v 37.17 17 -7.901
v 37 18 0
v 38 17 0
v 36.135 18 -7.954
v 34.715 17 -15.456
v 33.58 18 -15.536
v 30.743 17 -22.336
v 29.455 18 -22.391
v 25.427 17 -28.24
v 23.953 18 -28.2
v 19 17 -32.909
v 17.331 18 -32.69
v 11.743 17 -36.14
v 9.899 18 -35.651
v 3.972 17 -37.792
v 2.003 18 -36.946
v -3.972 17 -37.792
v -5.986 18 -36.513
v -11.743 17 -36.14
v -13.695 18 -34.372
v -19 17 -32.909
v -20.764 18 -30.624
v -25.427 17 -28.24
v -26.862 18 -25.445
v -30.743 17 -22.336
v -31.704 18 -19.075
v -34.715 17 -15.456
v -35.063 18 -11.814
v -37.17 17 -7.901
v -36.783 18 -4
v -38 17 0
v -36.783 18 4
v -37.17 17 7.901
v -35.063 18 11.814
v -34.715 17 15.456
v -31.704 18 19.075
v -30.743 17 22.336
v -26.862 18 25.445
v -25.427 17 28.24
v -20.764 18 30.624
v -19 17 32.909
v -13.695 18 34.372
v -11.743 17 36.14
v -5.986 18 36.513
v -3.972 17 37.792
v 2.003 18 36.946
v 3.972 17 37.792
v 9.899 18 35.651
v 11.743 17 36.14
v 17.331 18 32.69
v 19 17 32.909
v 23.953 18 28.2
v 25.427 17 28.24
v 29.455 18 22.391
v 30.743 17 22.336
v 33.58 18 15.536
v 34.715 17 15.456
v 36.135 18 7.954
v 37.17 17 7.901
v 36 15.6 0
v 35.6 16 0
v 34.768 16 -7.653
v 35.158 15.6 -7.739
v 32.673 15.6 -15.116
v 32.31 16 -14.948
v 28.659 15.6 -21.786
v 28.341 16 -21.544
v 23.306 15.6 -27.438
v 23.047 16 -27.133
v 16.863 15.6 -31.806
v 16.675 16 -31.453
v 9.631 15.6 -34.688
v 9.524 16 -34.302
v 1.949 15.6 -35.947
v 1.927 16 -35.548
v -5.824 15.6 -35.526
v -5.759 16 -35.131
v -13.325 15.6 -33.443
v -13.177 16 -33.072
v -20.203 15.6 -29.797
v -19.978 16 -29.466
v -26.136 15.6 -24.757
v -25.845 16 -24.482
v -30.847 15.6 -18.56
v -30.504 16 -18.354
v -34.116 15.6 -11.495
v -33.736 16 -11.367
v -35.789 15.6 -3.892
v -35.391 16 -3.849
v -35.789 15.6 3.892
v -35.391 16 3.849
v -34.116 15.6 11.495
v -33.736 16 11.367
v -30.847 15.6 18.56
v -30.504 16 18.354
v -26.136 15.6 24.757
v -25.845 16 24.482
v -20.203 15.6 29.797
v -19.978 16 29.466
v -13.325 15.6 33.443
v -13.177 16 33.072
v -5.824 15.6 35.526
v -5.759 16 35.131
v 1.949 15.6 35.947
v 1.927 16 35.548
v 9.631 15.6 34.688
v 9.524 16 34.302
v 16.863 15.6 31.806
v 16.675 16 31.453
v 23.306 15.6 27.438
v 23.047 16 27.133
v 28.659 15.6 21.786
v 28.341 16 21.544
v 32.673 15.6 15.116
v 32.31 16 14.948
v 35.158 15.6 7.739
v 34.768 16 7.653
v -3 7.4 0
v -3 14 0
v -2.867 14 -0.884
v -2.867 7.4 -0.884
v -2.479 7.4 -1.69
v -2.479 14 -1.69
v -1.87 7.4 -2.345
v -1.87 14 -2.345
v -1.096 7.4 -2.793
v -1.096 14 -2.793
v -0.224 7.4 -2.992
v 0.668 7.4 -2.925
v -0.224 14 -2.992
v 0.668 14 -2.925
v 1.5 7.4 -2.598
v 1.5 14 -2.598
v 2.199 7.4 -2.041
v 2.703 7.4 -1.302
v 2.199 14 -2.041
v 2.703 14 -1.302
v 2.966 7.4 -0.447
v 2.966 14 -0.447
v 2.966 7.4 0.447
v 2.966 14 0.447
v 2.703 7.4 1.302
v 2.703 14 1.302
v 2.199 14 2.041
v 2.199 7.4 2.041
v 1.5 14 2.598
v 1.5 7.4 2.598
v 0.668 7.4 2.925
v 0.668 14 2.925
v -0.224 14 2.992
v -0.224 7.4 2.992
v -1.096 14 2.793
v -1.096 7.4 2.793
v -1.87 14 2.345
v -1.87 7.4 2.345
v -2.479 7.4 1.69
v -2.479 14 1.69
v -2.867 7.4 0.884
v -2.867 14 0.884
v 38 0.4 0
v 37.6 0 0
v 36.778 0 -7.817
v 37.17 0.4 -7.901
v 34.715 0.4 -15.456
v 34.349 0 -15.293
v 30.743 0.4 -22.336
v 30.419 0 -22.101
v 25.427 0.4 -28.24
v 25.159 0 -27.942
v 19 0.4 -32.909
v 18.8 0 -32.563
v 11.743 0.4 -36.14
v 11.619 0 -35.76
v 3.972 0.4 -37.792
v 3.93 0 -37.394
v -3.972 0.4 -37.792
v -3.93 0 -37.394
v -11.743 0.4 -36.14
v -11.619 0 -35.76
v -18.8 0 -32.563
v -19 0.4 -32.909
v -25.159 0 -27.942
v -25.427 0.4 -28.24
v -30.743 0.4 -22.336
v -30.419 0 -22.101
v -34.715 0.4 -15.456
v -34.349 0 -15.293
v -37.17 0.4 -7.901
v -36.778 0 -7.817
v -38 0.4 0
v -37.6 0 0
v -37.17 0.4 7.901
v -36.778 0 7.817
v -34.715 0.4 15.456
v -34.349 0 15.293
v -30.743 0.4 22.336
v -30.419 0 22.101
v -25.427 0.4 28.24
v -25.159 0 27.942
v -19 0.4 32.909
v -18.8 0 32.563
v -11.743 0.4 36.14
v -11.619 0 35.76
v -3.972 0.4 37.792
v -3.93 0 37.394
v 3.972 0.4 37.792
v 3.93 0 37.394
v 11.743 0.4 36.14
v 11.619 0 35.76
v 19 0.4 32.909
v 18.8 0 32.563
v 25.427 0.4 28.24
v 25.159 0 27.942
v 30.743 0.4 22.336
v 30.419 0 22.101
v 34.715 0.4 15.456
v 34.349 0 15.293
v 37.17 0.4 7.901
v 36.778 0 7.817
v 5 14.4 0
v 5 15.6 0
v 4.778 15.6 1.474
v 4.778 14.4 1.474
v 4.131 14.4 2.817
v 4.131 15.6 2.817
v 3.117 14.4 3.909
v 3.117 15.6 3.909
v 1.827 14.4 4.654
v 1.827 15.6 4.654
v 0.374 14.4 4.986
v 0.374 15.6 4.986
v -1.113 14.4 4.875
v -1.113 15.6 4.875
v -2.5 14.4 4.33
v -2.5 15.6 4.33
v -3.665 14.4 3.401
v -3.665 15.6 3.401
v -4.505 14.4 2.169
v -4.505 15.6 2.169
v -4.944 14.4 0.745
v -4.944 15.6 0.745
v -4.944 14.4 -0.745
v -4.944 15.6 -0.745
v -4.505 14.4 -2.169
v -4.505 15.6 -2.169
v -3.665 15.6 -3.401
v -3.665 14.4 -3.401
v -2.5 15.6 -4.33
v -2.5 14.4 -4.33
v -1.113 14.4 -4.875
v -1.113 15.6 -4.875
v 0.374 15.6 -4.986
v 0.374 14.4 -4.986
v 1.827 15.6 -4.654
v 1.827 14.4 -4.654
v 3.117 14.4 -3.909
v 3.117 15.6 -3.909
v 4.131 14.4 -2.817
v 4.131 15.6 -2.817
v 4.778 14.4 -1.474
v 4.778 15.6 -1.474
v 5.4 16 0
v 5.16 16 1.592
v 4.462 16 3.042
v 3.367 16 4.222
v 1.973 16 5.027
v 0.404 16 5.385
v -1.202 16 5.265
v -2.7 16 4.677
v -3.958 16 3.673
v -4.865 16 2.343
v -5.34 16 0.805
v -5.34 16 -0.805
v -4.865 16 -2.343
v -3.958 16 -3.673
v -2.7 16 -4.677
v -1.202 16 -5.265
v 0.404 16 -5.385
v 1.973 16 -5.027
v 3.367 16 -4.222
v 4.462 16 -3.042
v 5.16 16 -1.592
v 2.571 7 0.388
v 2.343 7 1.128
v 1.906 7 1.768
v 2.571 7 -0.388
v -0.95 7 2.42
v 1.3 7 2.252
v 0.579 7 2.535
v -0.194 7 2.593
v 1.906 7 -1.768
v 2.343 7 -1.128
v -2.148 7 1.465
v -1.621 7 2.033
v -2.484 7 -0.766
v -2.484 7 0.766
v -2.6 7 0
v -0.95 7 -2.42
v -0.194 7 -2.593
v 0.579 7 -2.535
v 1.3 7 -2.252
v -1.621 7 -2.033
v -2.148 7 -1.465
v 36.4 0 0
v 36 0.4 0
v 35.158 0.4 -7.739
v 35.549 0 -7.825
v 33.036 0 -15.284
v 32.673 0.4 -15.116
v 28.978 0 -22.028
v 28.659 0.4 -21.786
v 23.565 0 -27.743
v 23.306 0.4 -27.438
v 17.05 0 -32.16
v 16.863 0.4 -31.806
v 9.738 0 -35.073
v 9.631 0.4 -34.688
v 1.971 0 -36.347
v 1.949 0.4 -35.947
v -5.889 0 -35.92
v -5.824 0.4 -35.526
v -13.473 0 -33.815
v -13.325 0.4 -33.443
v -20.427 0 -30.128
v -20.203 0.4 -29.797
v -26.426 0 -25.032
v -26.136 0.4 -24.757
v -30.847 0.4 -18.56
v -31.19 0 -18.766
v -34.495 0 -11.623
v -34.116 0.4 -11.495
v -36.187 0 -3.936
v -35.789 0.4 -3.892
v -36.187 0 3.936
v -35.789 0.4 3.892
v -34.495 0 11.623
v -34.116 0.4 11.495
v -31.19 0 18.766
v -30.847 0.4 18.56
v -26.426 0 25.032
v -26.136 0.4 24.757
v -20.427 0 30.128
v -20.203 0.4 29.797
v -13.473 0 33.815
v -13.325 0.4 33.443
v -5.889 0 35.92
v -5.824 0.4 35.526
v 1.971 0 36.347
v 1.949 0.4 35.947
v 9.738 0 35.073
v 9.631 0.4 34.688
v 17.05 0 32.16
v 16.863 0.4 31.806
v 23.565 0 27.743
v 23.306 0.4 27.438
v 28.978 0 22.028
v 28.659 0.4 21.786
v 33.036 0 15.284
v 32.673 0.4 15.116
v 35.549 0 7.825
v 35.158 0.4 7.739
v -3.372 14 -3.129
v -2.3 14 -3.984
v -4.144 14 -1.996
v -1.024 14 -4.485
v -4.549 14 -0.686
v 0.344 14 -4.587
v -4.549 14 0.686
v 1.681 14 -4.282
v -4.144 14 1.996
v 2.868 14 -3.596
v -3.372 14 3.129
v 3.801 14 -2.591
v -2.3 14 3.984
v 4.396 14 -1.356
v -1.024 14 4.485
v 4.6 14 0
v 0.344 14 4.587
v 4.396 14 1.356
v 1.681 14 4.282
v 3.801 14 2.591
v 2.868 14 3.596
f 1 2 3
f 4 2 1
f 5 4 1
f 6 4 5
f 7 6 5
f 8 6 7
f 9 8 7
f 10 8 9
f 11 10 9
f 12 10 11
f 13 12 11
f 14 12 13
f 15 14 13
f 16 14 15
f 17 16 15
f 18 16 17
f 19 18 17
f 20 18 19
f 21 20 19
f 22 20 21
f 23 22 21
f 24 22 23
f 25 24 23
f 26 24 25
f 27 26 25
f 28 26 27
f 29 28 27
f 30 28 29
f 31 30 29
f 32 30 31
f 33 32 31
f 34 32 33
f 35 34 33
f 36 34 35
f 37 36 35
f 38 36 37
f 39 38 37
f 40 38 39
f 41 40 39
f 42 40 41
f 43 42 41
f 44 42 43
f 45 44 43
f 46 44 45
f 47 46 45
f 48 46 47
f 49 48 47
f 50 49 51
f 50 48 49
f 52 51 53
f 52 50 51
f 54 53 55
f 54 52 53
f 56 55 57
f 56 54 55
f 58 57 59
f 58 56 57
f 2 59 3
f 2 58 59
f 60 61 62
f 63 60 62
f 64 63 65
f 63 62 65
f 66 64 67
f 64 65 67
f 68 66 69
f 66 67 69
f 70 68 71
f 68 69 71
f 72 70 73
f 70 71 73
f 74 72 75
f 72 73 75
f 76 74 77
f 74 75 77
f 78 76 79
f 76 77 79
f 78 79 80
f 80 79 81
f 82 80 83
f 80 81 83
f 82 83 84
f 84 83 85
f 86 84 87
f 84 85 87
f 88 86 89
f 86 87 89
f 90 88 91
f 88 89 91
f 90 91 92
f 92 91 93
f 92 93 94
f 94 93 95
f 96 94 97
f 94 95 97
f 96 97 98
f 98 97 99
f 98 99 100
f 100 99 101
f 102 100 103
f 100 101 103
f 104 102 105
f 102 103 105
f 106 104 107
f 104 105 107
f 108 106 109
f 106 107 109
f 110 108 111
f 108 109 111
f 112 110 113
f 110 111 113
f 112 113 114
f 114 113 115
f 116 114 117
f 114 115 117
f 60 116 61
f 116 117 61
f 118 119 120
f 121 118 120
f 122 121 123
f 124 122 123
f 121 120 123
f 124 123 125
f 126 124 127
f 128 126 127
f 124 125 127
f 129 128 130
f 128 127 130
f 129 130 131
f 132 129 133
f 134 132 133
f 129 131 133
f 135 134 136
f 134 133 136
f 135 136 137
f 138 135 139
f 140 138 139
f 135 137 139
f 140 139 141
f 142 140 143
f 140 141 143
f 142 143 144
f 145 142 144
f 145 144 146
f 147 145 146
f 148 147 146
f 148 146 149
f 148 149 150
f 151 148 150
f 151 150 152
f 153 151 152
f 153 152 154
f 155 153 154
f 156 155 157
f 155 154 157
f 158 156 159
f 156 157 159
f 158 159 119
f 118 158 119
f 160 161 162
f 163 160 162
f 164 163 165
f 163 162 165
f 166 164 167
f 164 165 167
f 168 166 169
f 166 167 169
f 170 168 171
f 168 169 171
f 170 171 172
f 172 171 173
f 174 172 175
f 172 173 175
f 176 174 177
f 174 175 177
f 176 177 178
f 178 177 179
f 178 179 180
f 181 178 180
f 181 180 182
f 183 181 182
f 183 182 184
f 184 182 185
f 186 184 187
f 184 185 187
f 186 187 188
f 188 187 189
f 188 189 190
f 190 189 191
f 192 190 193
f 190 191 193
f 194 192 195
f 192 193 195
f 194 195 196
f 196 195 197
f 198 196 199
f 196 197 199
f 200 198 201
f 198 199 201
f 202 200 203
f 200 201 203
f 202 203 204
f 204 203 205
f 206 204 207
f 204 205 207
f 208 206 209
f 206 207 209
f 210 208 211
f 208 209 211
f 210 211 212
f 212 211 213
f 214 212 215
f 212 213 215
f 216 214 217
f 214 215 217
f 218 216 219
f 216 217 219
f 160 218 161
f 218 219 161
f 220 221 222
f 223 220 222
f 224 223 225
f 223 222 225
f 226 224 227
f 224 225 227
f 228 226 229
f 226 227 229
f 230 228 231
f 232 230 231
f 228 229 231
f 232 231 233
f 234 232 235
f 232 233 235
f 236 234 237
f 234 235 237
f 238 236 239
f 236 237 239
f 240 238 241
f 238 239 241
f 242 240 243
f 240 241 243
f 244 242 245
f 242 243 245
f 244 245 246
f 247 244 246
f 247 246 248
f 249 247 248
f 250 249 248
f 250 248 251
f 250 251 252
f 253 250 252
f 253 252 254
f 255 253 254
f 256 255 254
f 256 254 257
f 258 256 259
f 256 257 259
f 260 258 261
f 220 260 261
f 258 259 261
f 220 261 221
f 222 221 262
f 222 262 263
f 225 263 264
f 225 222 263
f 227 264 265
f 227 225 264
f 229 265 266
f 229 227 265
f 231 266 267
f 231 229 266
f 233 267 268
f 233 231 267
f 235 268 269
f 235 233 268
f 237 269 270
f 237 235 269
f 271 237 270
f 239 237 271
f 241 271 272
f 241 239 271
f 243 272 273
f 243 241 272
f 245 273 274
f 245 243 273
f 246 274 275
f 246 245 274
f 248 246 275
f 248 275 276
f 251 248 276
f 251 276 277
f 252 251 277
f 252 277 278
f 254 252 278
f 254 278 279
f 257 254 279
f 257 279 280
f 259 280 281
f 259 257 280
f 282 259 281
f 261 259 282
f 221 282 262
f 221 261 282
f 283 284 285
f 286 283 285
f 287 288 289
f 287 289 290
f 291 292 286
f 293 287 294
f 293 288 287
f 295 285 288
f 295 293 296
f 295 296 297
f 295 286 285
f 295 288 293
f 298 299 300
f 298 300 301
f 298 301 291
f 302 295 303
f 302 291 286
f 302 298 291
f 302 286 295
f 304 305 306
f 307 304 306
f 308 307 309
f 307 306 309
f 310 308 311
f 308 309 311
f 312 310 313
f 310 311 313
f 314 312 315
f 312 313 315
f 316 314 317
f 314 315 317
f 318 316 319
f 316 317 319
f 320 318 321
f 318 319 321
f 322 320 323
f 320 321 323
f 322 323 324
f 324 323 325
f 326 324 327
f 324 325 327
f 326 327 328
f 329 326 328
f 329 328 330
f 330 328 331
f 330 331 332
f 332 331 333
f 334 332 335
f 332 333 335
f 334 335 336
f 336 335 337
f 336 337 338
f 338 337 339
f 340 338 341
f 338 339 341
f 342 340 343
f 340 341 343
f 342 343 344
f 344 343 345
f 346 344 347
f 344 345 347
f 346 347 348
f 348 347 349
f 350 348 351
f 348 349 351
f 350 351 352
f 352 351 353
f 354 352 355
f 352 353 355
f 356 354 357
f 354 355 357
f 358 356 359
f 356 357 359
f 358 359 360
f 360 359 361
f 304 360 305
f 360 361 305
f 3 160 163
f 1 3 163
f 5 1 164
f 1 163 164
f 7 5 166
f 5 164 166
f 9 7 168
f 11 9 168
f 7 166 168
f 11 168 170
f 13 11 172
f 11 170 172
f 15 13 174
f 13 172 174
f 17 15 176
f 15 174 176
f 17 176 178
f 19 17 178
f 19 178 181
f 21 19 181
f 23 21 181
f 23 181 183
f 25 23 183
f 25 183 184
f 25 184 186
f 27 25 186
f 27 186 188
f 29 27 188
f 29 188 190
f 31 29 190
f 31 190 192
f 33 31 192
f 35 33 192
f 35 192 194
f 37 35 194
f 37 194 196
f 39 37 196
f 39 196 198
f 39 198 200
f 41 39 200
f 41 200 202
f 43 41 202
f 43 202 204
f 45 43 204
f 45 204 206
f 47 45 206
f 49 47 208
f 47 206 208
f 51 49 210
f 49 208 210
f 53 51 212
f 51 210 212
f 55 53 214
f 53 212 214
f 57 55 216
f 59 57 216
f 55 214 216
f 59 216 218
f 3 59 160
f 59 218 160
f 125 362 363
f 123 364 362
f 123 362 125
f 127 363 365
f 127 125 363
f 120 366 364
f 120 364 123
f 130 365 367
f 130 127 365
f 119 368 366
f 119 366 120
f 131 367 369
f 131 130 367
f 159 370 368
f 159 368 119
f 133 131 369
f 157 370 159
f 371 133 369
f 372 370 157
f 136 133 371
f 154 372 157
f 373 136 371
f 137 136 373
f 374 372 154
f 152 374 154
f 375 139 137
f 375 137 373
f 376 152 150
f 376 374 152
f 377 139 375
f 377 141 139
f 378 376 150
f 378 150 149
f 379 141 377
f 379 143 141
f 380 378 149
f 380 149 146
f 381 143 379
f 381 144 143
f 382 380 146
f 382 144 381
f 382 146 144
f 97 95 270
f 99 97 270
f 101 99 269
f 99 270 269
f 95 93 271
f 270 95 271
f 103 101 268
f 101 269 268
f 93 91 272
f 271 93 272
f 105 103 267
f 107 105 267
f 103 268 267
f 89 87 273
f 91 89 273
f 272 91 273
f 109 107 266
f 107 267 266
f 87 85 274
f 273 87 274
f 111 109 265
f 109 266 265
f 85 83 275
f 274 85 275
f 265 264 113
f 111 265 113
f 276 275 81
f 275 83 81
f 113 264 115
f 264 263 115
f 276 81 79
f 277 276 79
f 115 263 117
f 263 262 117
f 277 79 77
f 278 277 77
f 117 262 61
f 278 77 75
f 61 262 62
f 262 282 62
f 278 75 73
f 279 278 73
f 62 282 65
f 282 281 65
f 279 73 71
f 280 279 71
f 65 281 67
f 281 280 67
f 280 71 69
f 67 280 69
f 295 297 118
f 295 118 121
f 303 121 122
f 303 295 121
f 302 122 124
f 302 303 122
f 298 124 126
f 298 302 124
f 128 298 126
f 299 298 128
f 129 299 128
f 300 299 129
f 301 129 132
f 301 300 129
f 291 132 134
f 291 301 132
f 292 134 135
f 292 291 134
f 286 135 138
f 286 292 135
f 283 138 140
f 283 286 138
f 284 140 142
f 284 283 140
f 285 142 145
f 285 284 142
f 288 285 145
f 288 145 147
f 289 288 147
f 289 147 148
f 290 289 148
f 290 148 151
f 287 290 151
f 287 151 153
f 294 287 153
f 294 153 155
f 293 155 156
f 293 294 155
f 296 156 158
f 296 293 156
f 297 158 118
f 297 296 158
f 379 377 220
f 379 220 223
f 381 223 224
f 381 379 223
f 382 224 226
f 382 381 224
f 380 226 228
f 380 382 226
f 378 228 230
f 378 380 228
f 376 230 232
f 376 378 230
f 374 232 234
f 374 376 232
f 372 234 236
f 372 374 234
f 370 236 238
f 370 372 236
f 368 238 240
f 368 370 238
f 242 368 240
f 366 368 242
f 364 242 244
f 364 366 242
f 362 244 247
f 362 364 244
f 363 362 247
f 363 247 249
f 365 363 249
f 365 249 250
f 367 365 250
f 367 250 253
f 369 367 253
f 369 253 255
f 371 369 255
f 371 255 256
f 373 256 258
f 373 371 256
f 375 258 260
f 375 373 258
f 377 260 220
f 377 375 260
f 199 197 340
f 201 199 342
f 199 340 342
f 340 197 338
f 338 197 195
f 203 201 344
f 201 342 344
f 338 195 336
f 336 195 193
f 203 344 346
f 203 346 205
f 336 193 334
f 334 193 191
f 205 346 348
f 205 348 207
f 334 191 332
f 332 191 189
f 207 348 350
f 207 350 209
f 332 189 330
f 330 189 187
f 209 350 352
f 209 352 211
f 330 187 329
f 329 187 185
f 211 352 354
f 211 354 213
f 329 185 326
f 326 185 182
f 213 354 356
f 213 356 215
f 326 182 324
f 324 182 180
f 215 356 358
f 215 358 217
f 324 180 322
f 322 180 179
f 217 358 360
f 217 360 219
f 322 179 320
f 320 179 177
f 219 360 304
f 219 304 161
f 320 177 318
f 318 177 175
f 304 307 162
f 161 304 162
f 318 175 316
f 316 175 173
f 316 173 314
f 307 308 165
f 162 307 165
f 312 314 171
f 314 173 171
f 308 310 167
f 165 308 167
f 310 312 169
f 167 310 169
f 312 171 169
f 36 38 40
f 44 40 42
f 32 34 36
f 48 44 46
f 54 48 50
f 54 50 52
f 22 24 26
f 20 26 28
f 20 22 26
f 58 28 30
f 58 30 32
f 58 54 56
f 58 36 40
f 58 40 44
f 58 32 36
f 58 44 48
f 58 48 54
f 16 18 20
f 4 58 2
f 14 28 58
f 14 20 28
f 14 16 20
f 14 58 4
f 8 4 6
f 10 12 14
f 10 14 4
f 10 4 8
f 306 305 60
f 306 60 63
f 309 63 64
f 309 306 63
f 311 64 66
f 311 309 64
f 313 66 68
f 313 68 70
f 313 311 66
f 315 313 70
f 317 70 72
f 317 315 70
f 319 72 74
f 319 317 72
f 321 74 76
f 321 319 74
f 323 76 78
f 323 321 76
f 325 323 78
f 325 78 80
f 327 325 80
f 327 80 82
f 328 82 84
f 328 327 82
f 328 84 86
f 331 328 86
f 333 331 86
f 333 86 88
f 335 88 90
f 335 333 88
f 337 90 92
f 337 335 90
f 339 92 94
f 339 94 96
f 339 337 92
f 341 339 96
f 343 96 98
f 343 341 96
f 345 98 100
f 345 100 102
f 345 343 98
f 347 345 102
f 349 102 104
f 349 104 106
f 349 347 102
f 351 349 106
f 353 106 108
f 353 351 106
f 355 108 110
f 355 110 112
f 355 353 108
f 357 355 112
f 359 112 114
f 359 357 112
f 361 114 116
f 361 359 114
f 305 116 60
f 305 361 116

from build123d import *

# Parameters (mm, degrees)
SKETCH1_R           = 38
SKETCH1_R_2         = 36
BOSS_EXTRUDE1_DEPTH = 16
SKETCH2_R           = 38
BOSS_EXTRUDE2_DEPTH = 2
CHAMFER1_SIZE       = 0.4
SKETCH3_R           = 5
BOSS_EXTRUDE3_DEPTH = 2
SKETCH4_R           = 3
BOSS_EXTRUDE4_DEPTH = 7
CHAMFER2_SIZE       = 0.4
CHAMFER3_SIZE       = 1


with BuildPart() as part:
    # Sketch1 → Boss-Extrude1 (new body)
    with BuildSketch(Plane(origin=(0, 0, 0), x_dir=(1, 0, 0), z_dir=(0, 1, 0))):
        Circle(SKETCH1_R)
        Circle(SKETCH1_R_2, mode=Mode.SUBTRACT)
    extrude(amount=BOSS_EXTRUDE1_DEPTH)

    # Sketch2 → Boss-Extrude2 (add)
    with BuildSketch(Plane(origin=(0, 16, 0), x_dir=(1, 0, 0), z_dir=(0, 1, 0))):
        Circle(SKETCH2_R)
    extrude(amount=BOSS_EXTRUDE2_DEPTH)

    # Chamfer1
    chamfer1_edges = [part.edges().sort_by_distance(p)[0] for p in [
        (-36, 16, 0),
        (-38, 0, 0),
        (-36, 0, 0),
    ]]
    chamfer(chamfer1_edges, length=CHAMFER1_SIZE)

    # Sketch3 → Boss-Extrude3 (add)
    with BuildSketch(Plane.XZ.offset(-16)):
        Circle(SKETCH3_R)
    extrude(amount=BOSS_EXTRUDE3_DEPTH)

    # Sketch4 → Boss-Extrude4 (add)
    with BuildSketch(Plane(origin=(0, 14, 0), x_dir=(-1, 0, 0), z_dir=(0, -1, 0))):
        Circle(SKETCH4_R)
    extrude(amount=BOSS_EXTRUDE4_DEPTH)

    # Chamfer2
    chamfer2_edges = [part.edges().sort_by_distance(p)[0] for p in [
        (-5, 16, 0),
        (-5, 14, 0),
        (3, 7, 0),
    ]]
    chamfer(chamfer2_edges, length=CHAMFER2_SIZE)

    # Chamfer3
    chamfer3_edges = [part.edges().sort_by_distance(p)[0] for p in [
        (-38, 18, 0),
    ]]
    chamfer(chamfer3_edges, length=CHAMFER3_SIZE)


solid = part.part
